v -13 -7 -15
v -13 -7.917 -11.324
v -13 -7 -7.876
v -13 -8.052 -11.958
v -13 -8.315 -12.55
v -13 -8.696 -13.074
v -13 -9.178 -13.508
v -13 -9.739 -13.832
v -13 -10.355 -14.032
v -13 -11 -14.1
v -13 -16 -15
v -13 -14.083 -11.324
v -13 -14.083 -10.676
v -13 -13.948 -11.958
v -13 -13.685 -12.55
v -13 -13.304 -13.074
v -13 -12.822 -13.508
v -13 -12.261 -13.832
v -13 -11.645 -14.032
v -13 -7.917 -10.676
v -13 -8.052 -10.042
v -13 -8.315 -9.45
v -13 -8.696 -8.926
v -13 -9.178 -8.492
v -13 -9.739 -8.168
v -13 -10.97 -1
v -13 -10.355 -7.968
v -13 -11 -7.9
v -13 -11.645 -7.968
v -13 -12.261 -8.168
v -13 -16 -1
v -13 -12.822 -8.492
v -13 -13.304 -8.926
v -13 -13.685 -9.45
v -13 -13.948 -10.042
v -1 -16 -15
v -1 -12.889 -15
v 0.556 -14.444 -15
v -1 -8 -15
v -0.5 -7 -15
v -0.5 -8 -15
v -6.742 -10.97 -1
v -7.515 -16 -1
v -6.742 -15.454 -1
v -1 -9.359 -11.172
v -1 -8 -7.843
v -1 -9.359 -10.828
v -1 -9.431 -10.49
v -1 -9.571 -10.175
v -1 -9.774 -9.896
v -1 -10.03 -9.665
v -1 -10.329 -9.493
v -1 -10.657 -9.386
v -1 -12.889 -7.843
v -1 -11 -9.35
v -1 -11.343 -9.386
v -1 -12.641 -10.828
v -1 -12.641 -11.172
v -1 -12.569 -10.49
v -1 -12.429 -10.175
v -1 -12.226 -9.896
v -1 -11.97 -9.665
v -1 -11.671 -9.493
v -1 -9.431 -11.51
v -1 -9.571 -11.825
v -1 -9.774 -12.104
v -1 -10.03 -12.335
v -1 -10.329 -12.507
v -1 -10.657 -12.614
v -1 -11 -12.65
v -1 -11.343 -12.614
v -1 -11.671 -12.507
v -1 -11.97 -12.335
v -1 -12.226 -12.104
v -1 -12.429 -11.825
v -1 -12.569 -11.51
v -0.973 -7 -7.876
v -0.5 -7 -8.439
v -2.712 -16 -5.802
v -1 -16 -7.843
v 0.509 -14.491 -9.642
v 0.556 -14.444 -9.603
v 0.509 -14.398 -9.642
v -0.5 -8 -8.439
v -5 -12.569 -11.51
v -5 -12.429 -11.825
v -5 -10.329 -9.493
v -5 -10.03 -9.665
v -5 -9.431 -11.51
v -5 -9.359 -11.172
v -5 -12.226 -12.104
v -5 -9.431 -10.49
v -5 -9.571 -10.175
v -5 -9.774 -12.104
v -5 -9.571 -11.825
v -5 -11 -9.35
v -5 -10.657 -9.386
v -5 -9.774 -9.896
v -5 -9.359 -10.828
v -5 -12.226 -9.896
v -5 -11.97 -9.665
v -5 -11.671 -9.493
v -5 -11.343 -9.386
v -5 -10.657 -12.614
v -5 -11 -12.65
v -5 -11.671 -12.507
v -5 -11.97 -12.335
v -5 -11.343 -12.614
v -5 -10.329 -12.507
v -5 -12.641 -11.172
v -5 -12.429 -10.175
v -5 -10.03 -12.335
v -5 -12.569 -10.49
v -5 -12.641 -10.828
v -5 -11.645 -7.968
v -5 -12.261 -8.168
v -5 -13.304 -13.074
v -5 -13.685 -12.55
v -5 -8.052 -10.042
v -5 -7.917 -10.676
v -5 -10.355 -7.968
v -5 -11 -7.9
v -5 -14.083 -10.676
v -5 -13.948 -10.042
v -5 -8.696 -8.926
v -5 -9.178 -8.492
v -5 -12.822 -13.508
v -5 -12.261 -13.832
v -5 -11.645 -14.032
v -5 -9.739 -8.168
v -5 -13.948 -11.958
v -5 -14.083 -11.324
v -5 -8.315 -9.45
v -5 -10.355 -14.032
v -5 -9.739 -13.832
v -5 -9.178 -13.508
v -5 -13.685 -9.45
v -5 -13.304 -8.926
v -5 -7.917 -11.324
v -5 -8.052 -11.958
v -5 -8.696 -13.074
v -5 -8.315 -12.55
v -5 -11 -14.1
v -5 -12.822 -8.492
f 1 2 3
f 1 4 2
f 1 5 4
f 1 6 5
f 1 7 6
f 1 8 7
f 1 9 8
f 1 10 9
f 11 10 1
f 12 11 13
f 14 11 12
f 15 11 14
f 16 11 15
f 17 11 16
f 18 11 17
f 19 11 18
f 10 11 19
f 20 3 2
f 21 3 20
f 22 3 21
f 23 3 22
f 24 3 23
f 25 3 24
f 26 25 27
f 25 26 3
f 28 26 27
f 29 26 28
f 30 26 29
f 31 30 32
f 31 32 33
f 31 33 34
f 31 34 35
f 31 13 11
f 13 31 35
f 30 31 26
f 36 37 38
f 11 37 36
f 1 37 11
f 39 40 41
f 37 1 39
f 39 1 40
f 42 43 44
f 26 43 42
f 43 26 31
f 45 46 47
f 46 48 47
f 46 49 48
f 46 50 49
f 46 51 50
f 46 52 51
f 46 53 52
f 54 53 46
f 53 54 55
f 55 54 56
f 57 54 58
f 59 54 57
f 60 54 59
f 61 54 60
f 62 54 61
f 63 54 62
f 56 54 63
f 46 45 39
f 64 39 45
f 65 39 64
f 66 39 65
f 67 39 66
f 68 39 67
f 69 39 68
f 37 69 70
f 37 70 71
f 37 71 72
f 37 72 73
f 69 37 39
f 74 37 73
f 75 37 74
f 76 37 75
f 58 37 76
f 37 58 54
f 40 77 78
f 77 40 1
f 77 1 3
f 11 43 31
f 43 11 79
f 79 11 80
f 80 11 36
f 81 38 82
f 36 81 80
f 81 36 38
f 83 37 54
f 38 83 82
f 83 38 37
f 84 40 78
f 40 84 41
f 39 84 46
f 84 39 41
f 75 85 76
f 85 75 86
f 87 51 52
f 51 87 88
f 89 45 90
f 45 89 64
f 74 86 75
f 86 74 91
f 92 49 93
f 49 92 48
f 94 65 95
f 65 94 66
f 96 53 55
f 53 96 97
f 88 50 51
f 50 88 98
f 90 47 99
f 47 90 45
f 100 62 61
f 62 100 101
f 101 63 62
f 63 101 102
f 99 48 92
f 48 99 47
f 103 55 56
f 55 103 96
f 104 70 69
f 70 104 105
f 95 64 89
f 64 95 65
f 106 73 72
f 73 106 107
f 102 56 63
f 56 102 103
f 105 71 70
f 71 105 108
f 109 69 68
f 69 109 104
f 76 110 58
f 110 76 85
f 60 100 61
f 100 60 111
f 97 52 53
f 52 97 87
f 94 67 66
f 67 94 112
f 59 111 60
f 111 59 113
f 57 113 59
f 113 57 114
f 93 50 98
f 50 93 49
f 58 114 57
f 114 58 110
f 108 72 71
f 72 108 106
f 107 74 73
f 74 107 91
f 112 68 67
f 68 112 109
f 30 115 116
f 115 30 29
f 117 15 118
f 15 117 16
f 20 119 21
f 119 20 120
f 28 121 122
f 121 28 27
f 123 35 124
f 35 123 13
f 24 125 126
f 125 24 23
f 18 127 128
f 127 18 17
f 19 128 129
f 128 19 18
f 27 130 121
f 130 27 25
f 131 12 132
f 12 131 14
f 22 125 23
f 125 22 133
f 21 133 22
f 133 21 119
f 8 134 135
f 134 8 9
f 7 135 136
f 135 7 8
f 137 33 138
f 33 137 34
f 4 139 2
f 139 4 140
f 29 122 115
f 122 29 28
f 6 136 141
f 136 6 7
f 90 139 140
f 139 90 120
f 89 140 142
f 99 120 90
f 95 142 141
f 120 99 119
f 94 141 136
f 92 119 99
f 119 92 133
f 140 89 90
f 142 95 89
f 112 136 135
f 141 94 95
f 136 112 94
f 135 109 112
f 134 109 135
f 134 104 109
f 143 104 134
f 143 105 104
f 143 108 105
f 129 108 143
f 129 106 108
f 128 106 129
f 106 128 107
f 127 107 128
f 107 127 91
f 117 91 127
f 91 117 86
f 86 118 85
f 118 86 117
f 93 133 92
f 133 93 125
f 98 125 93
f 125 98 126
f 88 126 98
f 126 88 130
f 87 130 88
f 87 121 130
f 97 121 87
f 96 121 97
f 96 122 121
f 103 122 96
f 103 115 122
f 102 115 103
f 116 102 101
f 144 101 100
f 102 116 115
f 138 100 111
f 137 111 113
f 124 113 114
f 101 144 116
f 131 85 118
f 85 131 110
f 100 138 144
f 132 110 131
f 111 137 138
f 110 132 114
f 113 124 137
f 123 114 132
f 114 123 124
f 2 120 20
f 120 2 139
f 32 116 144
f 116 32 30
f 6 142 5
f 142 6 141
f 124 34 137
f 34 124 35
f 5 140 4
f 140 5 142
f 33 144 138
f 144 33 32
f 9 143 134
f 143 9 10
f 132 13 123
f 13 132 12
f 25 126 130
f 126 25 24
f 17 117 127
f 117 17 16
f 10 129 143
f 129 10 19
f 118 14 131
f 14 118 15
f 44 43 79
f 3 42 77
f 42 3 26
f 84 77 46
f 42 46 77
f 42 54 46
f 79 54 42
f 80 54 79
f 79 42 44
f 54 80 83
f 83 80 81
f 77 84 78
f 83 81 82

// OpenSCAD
// PRUSA iteration4
// Endstop block
// GNU GPL v3
// Josef Průša <iam@josefprusa.cz> and contributors
// http://www.reprap.org/wiki/Prusa_Mendel
// http://prusamendel.org

module endstop_block() {
  difference() {
    union() {
      // body
      translate([1, -16, 1]) cube([12, 9, 14]);
      translate([1, -16, 1]) rotate([0, 0, 45]) cube([3, 2.2, 14]);
      translate([0.5, -8, 1]) cube([3, 1, 14]);
    }

    // screw
    translate([-4, -11, 11]) rotate([0, 90, 0]) cylinder(r=1.65, h=10, $fn=30);
    translate([5, -11, 11]) rotate([0, 90, 0]) cylinder(r=3.1, h=10, $fn=30);

    // edges
    translate([-13, -22, -0]) rotate([45, 45, 0]) cube([15, 15, 15]);
    translate([-1, -0, -10]) rotate([60, 0, 0]) cube([15, 15, 15]);
    translate([-12, -20, 0]) rotate([0, 50, 0]) cube([15, 15, 15]);
  }
}

rotate([0, 180, 0]) endstop_block();
